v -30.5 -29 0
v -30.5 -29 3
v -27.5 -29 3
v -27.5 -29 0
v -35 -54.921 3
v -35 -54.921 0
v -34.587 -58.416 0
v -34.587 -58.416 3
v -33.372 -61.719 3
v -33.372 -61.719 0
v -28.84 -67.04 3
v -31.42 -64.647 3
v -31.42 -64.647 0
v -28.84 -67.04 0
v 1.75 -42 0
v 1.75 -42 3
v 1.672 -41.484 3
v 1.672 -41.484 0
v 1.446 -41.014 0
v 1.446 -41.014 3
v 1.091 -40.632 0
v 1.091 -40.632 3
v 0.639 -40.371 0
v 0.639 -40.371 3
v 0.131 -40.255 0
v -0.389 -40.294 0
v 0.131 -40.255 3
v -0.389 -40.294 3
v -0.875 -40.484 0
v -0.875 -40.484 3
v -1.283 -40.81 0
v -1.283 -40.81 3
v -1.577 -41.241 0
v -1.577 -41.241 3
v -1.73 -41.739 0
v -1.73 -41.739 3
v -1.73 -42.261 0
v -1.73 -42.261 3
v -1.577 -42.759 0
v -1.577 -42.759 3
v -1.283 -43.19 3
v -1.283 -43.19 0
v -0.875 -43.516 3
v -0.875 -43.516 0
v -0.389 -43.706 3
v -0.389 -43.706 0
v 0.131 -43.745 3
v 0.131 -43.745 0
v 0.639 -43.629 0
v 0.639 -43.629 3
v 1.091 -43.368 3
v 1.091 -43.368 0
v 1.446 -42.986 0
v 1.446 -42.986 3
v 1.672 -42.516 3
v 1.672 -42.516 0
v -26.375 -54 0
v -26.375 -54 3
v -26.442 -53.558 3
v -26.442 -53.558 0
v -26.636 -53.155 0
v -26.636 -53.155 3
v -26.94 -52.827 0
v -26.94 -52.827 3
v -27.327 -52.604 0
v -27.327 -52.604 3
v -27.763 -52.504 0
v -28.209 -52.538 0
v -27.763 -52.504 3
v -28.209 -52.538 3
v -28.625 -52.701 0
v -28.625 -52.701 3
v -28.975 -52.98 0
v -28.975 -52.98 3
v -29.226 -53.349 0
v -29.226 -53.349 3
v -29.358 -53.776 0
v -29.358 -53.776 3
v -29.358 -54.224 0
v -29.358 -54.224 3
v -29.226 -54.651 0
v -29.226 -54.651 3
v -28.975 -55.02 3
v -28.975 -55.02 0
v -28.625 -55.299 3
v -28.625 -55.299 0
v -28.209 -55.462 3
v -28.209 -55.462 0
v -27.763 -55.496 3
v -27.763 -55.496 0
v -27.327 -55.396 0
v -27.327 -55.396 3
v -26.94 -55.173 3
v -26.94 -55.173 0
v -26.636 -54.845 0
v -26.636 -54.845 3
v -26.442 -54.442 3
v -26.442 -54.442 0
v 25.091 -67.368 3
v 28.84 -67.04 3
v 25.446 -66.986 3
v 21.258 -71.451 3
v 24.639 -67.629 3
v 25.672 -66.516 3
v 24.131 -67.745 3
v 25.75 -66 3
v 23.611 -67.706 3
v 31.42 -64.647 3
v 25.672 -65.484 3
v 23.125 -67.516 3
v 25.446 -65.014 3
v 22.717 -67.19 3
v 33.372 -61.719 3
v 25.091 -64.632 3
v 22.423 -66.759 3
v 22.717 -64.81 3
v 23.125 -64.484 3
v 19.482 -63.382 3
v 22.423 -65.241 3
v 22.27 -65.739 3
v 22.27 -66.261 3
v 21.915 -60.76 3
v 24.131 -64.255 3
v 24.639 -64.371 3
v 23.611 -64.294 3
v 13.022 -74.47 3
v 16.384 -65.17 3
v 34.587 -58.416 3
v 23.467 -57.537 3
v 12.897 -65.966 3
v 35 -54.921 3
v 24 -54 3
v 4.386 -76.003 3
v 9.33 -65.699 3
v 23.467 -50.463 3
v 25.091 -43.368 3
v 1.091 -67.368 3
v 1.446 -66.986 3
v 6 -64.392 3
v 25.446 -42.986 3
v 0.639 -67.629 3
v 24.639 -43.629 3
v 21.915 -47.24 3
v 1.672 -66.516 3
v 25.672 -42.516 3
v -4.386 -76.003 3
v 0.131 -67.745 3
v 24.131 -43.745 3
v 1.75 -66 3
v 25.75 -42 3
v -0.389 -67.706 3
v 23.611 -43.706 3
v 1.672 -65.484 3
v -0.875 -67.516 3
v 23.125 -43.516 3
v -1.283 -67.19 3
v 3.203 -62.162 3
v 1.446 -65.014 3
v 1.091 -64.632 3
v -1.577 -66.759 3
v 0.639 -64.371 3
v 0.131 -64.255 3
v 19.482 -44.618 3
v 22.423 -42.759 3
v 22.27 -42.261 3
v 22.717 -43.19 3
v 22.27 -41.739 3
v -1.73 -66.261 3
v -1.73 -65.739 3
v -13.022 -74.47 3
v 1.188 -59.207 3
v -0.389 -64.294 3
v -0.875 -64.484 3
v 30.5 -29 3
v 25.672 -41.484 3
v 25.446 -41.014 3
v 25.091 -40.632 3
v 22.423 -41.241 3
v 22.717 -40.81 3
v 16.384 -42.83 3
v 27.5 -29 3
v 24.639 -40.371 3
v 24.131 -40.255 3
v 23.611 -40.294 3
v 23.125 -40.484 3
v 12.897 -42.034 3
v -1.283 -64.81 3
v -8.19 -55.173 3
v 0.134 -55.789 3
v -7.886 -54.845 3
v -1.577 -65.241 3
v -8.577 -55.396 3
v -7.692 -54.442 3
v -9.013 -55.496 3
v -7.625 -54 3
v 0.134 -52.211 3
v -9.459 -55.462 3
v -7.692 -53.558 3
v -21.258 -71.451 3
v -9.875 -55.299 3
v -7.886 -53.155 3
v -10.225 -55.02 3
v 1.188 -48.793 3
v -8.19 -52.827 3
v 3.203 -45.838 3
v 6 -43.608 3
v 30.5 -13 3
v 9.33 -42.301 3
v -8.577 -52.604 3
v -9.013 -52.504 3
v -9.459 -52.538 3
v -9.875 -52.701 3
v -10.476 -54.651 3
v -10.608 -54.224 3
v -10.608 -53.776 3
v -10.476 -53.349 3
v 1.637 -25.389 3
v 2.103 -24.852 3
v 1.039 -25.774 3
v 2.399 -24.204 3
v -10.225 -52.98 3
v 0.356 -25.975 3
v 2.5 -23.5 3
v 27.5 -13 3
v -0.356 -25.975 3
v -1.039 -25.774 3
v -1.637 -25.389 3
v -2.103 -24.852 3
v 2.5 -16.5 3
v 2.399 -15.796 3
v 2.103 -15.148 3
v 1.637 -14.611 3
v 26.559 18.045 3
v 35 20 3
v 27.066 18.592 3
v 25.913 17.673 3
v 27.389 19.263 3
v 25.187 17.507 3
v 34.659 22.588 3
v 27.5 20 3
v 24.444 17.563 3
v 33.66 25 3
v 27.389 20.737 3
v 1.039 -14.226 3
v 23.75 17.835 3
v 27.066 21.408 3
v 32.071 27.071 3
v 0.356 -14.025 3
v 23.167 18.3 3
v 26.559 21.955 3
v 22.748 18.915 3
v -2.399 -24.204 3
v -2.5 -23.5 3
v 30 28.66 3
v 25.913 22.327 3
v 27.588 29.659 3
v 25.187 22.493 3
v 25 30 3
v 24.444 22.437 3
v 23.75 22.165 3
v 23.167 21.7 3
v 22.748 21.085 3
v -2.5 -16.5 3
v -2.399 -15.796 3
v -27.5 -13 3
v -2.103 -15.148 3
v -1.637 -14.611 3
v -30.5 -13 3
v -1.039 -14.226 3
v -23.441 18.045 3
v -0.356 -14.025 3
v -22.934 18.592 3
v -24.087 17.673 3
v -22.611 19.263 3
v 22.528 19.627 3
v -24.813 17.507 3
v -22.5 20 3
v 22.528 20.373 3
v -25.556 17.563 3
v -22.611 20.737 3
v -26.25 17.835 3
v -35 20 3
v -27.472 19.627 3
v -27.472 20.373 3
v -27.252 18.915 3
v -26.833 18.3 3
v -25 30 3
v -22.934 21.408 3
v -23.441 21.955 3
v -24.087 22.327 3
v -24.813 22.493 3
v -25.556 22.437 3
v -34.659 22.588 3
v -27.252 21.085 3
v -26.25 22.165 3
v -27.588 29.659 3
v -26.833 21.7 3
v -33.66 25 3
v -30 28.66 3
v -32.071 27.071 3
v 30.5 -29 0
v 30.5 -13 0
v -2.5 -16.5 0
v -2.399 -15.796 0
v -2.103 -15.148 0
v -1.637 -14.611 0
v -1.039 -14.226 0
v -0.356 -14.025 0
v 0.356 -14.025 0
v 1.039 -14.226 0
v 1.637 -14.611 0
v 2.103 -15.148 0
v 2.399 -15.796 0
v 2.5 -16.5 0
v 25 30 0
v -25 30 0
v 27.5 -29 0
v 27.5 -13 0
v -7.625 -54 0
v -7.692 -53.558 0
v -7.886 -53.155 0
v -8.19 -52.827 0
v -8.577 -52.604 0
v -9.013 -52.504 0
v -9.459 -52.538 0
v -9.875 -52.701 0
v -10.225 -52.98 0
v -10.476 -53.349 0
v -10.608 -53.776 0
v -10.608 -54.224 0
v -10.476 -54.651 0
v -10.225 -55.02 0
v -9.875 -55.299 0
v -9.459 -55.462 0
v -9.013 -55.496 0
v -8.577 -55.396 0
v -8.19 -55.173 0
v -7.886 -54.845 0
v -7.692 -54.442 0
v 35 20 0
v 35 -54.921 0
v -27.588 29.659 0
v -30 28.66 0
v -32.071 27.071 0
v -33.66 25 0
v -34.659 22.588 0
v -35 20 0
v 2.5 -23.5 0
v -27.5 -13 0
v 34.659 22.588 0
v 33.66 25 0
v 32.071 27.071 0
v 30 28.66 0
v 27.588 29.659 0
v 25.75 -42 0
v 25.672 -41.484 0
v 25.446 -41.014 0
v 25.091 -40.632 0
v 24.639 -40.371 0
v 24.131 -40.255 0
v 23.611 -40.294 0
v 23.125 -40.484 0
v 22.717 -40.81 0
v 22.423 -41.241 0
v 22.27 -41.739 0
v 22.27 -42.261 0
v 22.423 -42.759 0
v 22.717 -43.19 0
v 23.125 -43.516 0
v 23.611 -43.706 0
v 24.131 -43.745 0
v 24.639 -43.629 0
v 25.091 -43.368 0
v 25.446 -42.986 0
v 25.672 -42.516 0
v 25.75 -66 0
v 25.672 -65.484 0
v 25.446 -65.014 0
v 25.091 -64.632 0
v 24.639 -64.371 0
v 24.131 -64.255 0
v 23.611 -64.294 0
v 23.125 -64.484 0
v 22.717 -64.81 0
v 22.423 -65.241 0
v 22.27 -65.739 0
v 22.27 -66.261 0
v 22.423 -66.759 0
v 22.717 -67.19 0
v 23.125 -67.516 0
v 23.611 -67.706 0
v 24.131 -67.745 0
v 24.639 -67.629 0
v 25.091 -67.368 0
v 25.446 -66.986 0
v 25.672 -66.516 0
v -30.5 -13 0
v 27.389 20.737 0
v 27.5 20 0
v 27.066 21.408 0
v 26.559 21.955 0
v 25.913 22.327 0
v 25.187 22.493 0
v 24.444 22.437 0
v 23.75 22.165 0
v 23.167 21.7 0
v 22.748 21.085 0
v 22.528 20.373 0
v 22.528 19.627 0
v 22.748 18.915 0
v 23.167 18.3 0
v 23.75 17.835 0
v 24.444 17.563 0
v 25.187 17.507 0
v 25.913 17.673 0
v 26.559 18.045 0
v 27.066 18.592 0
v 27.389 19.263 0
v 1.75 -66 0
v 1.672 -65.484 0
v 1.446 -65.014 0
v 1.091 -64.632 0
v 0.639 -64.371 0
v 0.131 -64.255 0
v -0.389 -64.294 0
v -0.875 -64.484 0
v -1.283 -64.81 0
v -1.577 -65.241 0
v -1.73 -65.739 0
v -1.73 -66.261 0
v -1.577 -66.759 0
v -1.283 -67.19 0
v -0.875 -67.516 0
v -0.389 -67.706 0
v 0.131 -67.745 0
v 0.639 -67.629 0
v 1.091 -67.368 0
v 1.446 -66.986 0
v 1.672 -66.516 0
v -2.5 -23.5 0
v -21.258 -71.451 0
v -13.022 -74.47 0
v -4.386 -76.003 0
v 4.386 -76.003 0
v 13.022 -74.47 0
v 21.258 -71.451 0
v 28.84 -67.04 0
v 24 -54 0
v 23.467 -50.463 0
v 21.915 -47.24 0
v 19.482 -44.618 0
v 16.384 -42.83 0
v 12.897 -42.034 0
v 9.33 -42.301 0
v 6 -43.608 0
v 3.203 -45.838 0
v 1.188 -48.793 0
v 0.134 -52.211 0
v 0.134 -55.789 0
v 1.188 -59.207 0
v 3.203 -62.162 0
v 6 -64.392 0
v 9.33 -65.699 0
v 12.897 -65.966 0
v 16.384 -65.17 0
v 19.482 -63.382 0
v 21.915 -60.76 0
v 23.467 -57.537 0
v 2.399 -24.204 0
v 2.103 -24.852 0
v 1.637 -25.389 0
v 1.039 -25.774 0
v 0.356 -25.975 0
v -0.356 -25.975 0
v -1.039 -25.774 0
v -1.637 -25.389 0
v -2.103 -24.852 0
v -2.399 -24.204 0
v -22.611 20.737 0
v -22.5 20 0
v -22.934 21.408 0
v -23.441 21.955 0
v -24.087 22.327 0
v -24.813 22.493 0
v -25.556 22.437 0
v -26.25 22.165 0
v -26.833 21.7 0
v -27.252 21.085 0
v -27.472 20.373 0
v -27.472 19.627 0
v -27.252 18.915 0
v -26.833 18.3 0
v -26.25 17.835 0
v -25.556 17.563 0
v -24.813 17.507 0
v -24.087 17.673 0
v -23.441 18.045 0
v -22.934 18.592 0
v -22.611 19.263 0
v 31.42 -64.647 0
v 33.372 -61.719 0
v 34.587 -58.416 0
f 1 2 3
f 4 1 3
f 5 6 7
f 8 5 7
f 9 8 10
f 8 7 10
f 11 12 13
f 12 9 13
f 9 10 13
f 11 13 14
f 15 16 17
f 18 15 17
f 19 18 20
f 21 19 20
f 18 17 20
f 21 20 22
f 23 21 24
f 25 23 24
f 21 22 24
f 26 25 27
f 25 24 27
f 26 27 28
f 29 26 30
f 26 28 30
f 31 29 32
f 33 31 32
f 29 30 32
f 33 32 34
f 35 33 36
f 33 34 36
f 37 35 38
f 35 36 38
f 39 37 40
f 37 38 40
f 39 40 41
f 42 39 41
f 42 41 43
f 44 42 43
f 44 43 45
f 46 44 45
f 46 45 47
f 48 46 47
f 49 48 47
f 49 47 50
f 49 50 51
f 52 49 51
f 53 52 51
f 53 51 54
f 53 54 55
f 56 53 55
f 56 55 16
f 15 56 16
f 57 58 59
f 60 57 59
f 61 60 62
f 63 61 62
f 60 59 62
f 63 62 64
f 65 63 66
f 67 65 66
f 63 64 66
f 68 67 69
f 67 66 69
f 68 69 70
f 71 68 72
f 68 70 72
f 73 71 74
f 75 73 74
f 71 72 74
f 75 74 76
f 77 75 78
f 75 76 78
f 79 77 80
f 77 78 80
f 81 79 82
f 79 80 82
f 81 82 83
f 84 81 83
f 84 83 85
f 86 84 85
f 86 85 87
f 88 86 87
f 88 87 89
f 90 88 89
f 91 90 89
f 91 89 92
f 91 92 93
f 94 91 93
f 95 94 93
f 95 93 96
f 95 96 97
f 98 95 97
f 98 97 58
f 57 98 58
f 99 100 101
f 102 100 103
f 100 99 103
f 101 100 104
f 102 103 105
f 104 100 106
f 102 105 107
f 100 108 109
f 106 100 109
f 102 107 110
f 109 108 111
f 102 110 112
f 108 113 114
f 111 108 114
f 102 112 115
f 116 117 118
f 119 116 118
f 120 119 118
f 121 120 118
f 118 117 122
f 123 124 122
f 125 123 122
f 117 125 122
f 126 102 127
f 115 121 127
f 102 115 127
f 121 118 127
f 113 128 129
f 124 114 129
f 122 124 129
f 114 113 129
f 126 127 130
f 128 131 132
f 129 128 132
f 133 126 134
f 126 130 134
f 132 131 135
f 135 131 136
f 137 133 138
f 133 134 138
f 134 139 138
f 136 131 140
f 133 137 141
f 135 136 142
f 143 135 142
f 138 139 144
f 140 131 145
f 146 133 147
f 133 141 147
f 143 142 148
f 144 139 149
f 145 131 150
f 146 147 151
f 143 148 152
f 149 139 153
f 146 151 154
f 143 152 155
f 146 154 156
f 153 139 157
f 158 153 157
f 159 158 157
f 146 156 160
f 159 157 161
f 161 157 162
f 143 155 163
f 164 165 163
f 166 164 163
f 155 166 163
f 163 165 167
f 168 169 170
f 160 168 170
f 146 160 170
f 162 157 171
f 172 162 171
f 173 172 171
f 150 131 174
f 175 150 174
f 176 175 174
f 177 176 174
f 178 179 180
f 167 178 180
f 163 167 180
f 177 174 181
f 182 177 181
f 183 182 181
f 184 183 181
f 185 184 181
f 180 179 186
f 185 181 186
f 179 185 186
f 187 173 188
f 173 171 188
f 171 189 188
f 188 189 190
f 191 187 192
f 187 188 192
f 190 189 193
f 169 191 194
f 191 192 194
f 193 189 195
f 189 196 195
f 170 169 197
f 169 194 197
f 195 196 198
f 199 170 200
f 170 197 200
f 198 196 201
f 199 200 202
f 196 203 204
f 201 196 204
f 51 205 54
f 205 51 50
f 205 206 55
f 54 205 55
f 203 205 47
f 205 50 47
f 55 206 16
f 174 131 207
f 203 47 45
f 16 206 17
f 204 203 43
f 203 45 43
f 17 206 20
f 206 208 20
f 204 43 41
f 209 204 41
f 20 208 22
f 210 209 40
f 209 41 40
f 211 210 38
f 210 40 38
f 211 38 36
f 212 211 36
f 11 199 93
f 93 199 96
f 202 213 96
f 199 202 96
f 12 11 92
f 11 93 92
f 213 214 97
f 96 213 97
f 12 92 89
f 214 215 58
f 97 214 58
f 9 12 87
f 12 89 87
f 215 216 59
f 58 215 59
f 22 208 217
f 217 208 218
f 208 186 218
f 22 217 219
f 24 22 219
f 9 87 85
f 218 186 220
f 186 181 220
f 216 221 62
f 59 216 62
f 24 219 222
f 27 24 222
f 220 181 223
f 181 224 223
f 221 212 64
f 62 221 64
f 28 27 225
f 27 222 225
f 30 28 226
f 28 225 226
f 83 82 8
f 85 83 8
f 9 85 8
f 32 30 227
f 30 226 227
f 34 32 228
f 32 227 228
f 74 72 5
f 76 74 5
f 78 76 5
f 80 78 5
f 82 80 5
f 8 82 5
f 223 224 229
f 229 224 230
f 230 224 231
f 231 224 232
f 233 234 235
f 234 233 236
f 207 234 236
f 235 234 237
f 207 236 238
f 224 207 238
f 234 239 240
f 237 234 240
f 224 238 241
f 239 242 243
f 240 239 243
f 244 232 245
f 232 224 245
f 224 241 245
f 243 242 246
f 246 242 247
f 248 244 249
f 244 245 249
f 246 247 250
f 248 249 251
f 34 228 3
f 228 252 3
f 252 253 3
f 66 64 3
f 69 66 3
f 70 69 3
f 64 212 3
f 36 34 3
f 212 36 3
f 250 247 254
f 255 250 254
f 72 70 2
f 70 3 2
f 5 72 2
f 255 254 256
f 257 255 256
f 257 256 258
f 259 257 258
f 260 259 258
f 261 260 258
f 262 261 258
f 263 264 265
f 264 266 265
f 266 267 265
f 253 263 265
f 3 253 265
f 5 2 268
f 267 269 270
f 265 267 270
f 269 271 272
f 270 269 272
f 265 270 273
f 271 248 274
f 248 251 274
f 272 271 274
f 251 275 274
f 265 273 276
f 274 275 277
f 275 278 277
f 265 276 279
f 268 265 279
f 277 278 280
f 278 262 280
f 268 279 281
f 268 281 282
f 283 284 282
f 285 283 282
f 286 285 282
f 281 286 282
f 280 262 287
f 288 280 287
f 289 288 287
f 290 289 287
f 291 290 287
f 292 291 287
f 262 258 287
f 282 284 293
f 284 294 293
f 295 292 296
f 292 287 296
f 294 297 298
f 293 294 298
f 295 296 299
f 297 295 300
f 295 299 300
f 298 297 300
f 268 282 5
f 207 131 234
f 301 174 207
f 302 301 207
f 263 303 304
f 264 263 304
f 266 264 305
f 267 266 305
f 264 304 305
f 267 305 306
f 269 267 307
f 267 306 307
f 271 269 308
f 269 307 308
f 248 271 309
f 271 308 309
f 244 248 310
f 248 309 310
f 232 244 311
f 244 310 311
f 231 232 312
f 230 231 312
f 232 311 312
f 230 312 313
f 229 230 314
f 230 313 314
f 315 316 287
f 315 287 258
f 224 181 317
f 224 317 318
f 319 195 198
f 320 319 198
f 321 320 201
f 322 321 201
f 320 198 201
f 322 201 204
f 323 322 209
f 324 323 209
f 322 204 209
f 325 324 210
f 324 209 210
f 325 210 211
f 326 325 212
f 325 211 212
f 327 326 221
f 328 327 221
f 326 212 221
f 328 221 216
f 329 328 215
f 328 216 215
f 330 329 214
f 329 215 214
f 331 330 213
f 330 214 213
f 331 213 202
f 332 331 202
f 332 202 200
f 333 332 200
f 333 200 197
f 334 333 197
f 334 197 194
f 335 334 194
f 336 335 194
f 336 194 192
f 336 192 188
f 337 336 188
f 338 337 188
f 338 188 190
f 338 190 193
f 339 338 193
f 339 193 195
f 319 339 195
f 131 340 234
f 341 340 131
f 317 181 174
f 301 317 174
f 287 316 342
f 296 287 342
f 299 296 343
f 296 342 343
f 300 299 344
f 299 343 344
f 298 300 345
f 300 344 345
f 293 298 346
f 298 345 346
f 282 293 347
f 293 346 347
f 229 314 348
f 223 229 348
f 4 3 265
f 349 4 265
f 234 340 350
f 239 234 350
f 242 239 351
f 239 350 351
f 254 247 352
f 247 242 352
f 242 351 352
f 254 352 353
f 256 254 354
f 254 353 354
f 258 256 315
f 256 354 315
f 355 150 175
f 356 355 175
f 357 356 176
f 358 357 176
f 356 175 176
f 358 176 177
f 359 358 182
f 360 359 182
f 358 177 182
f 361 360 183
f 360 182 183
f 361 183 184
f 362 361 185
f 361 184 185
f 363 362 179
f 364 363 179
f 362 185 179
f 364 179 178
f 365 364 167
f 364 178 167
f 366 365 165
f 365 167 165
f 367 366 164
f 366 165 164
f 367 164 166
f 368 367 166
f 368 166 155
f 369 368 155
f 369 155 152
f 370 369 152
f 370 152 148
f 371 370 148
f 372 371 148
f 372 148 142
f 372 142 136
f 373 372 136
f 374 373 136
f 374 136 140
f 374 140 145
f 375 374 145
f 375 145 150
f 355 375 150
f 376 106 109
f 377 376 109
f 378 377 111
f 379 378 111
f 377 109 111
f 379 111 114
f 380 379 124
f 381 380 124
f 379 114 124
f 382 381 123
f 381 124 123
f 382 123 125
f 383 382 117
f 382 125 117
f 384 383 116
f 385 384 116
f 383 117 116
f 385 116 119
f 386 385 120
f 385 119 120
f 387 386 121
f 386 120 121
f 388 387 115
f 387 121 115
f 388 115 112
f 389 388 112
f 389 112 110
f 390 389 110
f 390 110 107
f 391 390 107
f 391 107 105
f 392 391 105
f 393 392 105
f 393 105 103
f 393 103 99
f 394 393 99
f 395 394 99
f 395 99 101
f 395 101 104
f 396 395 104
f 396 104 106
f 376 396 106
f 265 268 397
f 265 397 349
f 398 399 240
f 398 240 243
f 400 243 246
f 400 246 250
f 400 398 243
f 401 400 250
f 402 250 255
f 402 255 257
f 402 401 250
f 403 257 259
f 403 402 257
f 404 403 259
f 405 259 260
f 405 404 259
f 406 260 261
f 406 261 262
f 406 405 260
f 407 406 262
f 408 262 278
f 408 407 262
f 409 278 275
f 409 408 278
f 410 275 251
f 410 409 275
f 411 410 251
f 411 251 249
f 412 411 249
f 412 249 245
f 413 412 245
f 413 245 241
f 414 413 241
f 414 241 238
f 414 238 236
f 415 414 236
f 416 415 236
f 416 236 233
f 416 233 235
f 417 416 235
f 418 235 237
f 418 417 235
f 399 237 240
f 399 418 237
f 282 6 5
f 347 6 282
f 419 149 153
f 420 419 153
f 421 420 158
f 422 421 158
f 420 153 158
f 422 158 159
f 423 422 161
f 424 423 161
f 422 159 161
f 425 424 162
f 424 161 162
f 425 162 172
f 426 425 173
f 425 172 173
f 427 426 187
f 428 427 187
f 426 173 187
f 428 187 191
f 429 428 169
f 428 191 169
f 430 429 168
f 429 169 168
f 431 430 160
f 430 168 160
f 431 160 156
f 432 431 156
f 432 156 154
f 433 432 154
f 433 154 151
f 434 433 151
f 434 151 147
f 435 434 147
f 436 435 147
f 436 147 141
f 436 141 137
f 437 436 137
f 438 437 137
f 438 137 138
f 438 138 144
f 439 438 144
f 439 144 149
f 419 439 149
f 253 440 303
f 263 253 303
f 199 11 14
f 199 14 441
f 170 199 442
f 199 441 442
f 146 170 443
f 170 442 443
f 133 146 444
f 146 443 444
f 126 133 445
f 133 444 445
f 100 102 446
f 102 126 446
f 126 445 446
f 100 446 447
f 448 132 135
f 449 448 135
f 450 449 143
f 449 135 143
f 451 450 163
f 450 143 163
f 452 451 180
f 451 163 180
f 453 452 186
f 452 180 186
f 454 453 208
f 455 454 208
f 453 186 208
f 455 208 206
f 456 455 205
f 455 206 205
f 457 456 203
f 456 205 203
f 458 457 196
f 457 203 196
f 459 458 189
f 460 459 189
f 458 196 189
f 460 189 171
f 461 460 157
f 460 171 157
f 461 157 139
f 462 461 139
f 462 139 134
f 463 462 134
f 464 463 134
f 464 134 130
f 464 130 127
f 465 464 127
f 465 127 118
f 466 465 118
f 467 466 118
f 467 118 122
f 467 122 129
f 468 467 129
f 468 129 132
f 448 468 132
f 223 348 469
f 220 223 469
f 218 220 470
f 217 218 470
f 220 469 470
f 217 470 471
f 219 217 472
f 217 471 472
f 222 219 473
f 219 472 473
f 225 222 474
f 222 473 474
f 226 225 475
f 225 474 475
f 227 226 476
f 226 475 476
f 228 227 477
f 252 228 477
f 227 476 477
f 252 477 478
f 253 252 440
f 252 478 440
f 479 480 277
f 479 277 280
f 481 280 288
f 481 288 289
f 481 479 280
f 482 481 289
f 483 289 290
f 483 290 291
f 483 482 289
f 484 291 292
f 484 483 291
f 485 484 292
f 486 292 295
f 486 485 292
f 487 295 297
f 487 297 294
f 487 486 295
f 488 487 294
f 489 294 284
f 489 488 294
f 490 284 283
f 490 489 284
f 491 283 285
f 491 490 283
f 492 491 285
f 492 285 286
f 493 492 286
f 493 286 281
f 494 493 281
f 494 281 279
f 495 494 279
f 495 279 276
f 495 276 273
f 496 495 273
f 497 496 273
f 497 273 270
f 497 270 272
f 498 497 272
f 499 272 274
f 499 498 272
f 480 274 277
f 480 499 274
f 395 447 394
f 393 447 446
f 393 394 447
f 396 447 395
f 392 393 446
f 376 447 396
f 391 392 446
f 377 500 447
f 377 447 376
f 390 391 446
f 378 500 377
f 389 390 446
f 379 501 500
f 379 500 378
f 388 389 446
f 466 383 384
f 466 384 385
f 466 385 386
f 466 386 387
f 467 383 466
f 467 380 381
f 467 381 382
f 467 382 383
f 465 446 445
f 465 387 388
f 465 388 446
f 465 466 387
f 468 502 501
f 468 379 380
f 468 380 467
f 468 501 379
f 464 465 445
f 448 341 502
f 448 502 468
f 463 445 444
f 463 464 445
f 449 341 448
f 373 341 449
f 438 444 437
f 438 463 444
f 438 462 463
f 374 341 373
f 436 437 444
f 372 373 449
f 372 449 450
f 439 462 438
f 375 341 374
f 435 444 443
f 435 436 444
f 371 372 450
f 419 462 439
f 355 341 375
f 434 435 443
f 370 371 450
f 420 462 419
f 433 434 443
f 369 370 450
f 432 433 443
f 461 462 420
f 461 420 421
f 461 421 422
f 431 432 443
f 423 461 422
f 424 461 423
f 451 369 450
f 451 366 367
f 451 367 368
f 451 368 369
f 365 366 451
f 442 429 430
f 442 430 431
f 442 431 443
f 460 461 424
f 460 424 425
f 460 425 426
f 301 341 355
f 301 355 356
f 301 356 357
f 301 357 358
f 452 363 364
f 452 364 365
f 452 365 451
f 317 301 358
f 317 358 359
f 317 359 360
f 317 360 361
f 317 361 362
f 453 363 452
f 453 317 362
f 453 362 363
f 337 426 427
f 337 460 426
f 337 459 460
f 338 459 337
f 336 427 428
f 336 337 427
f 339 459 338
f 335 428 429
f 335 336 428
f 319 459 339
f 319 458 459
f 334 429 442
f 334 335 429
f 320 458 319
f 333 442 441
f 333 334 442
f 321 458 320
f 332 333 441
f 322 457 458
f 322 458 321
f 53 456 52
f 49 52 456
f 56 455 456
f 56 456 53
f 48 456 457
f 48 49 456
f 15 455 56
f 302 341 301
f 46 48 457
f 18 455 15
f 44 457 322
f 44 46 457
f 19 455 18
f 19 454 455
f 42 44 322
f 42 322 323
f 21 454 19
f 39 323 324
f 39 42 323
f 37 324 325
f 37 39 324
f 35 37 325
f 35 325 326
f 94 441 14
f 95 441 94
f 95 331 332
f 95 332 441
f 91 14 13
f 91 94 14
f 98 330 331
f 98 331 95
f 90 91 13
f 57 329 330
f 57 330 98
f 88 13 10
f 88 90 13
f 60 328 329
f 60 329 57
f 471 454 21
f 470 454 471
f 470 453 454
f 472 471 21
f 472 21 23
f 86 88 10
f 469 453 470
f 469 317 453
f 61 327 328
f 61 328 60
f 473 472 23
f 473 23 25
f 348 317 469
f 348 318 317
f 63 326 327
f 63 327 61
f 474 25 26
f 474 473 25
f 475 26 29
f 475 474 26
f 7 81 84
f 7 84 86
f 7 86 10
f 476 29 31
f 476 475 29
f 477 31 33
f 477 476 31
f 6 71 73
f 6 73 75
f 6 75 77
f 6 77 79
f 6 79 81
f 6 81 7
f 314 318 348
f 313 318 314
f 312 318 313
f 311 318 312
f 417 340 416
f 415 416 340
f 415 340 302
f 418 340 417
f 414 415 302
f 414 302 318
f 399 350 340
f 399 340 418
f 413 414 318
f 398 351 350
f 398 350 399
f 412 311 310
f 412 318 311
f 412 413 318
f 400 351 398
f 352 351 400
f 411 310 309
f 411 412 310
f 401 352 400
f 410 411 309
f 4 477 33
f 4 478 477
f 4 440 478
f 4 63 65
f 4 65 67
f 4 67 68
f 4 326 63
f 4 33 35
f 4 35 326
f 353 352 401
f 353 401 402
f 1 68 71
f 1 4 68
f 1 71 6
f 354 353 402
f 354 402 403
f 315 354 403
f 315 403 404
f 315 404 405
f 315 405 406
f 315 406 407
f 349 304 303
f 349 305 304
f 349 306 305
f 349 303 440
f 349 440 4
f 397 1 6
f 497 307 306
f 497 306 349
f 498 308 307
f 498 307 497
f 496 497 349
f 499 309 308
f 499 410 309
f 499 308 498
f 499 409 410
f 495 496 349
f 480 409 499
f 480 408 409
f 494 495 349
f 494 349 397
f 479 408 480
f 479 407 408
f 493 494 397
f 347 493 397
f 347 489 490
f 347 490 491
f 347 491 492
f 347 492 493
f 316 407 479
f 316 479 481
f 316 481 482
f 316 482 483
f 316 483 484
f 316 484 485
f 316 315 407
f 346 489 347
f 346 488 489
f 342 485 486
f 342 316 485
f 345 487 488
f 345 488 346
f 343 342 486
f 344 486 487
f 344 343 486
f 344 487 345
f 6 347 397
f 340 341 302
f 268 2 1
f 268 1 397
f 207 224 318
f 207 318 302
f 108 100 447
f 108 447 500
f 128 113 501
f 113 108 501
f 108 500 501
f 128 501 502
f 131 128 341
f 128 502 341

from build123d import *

# Parameters (mm, degrees)
SKETCH1_R           = 2.5
BOSS_EXTRUDE1_DEPTH = 3
FILLET1_R           = 10
FILLET1_R_2         = 15
FILLET1_R_3         = 50
SKETCH2_R           = 1.75
SKETCH2_R_2         = 12
CUT_EXTRUDE1_DEPTH  = 84.903310475
SKETCH4_W           = 3
SKETCH4_H           = 16
CUT_EXTRUDE3_DEPTH  = 84.903310475
SKETCH9_R           = 1.5
CUT_EXTRUDE4_DEPTH  = 84.903310475


with BuildPart() as part:
    # Sketch1 → Boss-Extrude1 (new body)
    with BuildSketch(Plane.XY):
        Polygon((-35, 30), (35, 30), (35, -62.640754554), (0, -87.640754554), (-35, -62.640754554), align=None)
        with Locations((25, 20)):
            Circle(SKETCH1_R, mode=Mode.SUBTRACT)
        with Locations((-25, 20)):
            Circle(SKETCH1_R, mode=Mode.SUBTRACT)
        with BuildLine():
            Line((2.5, -16.5), (2.5, -23.5))
            ThreePointArc((2.5, -23.5), (0, -26), (-2.5, -23.5))
            Line((-2.5, -23.5), (-2.5, -16.5))
            ThreePointArc((-2.5, -16.5), (0, -14), (2.5, -16.5))
        make_face(mode=Mode.SUBTRACT)
    extrude(amount=BOSS_EXTRUDE1_DEPTH)

    # Fillet1
    # the kernel refuses this fillet: 50, 15, 10 mm, written as the material it takes off along each edge
    with BuildSketch(Plane(origin=(35, 30, -25), x_dir=(-1, 0, 0), z_dir=(0, 0, 1))) as fillet1_piece_1:
        with BuildLine():
            CenterArc((FILLET1_R, FILLET1_R), FILLET1_R, 180, 90)
            Line((0, FILLET1_R), (0, 0))
            Line((0, 0), (FILLET1_R, 0))
        make_face()
    extrude(amount=53, mode=Mode.SUBTRACT)
    with BuildSketch(Plane(origin=(-35, 30, -25), x_dir=(1, 0, 0), z_dir=(0, 0, 1))) as fillet1_piece_2:
        with BuildLine():
            CenterArc((FILLET1_R, -FILLET1_R), FILLET1_R, 90, 90)
            Line((0, -FILLET1_R), (0, 0))
            Line((0, 0), (FILLET1_R, 0))
        make_face()
    extrude(amount=53, mode=Mode.SUBTRACT)
    with BuildSketch(Plane(origin=(-35, -62.640754554, -19.298171073), x_dir=(0.8137334712067342, -0.5812381937190976, 0), z_dir=(0, 0, 1)), Plane(origin=(35, -62.640754554, -19.298171073), x_dir=(0, 1, 0), z_dir=(0, 0, 1))) as fillet1_piece_3:
        with BuildLine():
            CenterArc((FILLET1_R_2 * 0.514617895292, FILLET1_R_2), FILLET1_R_2, 215.537677792, 54.462322208)
            Line((-FILLET1_R_2 * 0.299115575915, FILLET1_R_2 * 0.418761806281), (0, 0))
            Line((0, 0), (FILLET1_R_2 * 0.514617895292, 0))
        make_face()
    extrude(amount=41.596342147, mode=Mode.SUBTRACT)
    with BuildSketch(Plane(origin=(0, -87.640754554, -89.285714286), x_dir=(0.8137334712067352, 0.5812381937190962, 0), z_dir=(0, 0, 1))) as fillet1_piece_4:
        with BuildLine():
            CenterArc((FILLET1_R_3 * 0.714285714286, FILLET1_R_3), FILLET1_R_3, 198.924644416, 71.075355584)
            Line((-FILLET1_R_3 * 0.23166023166, FILLET1_R_3 * 0.675675675676), (0, 0))
            Line((0, 0), (FILLET1_R_3 * 0.714285714286, 0))
        make_face()
    extrude(amount=181.571428571, mode=Mode.SUBTRACT)

    # Sketch2 → Cut-Extrude1 (cut, through all)
    with BuildSketch(Plane.XY.offset(3)):
        with Locations((24, -42)):
            Circle(SKETCH2_R)
        with Locations((0, -42)):
            Circle(SKETCH2_R)
        with Locations((0, -66)):
            Circle(SKETCH2_R)
        with Locations((24, -66)):
            Circle(SKETCH2_R)
        with Locations((12, -54)):
            Circle(SKETCH2_R_2)
    extrude(amount=-CUT_EXTRUDE1_DEPTH, mode=Mode.SUBTRACT)

    # Sketch4 → Cut-Extrude3 (cut, through all)
    with BuildSketch(Plane.XY.offset(3)):
        with Locations((29, -21)):
            Rectangle(SKETCH4_W, SKETCH4_H)
        with Locations((-29, -21)):
            Rectangle(SKETCH4_W, SKETCH4_H)
    extrude(amount=-CUT_EXTRUDE3_DEPTH, mode=Mode.SUBTRACT)

    # Sketch9 → Cut-Extrude4 (cut, through all)
    with BuildSketch(Plane.XY.offset(3)):
        with Locations((-27.875, -54)):
            Circle(SKETCH9_R)
        with Locations((-9.125, -54)):
            Circle(SKETCH9_R)
    extrude(amount=-CUT_EXTRUDE4_DEPTH, mode=Mode.SUBTRACT)


solid = part.part
